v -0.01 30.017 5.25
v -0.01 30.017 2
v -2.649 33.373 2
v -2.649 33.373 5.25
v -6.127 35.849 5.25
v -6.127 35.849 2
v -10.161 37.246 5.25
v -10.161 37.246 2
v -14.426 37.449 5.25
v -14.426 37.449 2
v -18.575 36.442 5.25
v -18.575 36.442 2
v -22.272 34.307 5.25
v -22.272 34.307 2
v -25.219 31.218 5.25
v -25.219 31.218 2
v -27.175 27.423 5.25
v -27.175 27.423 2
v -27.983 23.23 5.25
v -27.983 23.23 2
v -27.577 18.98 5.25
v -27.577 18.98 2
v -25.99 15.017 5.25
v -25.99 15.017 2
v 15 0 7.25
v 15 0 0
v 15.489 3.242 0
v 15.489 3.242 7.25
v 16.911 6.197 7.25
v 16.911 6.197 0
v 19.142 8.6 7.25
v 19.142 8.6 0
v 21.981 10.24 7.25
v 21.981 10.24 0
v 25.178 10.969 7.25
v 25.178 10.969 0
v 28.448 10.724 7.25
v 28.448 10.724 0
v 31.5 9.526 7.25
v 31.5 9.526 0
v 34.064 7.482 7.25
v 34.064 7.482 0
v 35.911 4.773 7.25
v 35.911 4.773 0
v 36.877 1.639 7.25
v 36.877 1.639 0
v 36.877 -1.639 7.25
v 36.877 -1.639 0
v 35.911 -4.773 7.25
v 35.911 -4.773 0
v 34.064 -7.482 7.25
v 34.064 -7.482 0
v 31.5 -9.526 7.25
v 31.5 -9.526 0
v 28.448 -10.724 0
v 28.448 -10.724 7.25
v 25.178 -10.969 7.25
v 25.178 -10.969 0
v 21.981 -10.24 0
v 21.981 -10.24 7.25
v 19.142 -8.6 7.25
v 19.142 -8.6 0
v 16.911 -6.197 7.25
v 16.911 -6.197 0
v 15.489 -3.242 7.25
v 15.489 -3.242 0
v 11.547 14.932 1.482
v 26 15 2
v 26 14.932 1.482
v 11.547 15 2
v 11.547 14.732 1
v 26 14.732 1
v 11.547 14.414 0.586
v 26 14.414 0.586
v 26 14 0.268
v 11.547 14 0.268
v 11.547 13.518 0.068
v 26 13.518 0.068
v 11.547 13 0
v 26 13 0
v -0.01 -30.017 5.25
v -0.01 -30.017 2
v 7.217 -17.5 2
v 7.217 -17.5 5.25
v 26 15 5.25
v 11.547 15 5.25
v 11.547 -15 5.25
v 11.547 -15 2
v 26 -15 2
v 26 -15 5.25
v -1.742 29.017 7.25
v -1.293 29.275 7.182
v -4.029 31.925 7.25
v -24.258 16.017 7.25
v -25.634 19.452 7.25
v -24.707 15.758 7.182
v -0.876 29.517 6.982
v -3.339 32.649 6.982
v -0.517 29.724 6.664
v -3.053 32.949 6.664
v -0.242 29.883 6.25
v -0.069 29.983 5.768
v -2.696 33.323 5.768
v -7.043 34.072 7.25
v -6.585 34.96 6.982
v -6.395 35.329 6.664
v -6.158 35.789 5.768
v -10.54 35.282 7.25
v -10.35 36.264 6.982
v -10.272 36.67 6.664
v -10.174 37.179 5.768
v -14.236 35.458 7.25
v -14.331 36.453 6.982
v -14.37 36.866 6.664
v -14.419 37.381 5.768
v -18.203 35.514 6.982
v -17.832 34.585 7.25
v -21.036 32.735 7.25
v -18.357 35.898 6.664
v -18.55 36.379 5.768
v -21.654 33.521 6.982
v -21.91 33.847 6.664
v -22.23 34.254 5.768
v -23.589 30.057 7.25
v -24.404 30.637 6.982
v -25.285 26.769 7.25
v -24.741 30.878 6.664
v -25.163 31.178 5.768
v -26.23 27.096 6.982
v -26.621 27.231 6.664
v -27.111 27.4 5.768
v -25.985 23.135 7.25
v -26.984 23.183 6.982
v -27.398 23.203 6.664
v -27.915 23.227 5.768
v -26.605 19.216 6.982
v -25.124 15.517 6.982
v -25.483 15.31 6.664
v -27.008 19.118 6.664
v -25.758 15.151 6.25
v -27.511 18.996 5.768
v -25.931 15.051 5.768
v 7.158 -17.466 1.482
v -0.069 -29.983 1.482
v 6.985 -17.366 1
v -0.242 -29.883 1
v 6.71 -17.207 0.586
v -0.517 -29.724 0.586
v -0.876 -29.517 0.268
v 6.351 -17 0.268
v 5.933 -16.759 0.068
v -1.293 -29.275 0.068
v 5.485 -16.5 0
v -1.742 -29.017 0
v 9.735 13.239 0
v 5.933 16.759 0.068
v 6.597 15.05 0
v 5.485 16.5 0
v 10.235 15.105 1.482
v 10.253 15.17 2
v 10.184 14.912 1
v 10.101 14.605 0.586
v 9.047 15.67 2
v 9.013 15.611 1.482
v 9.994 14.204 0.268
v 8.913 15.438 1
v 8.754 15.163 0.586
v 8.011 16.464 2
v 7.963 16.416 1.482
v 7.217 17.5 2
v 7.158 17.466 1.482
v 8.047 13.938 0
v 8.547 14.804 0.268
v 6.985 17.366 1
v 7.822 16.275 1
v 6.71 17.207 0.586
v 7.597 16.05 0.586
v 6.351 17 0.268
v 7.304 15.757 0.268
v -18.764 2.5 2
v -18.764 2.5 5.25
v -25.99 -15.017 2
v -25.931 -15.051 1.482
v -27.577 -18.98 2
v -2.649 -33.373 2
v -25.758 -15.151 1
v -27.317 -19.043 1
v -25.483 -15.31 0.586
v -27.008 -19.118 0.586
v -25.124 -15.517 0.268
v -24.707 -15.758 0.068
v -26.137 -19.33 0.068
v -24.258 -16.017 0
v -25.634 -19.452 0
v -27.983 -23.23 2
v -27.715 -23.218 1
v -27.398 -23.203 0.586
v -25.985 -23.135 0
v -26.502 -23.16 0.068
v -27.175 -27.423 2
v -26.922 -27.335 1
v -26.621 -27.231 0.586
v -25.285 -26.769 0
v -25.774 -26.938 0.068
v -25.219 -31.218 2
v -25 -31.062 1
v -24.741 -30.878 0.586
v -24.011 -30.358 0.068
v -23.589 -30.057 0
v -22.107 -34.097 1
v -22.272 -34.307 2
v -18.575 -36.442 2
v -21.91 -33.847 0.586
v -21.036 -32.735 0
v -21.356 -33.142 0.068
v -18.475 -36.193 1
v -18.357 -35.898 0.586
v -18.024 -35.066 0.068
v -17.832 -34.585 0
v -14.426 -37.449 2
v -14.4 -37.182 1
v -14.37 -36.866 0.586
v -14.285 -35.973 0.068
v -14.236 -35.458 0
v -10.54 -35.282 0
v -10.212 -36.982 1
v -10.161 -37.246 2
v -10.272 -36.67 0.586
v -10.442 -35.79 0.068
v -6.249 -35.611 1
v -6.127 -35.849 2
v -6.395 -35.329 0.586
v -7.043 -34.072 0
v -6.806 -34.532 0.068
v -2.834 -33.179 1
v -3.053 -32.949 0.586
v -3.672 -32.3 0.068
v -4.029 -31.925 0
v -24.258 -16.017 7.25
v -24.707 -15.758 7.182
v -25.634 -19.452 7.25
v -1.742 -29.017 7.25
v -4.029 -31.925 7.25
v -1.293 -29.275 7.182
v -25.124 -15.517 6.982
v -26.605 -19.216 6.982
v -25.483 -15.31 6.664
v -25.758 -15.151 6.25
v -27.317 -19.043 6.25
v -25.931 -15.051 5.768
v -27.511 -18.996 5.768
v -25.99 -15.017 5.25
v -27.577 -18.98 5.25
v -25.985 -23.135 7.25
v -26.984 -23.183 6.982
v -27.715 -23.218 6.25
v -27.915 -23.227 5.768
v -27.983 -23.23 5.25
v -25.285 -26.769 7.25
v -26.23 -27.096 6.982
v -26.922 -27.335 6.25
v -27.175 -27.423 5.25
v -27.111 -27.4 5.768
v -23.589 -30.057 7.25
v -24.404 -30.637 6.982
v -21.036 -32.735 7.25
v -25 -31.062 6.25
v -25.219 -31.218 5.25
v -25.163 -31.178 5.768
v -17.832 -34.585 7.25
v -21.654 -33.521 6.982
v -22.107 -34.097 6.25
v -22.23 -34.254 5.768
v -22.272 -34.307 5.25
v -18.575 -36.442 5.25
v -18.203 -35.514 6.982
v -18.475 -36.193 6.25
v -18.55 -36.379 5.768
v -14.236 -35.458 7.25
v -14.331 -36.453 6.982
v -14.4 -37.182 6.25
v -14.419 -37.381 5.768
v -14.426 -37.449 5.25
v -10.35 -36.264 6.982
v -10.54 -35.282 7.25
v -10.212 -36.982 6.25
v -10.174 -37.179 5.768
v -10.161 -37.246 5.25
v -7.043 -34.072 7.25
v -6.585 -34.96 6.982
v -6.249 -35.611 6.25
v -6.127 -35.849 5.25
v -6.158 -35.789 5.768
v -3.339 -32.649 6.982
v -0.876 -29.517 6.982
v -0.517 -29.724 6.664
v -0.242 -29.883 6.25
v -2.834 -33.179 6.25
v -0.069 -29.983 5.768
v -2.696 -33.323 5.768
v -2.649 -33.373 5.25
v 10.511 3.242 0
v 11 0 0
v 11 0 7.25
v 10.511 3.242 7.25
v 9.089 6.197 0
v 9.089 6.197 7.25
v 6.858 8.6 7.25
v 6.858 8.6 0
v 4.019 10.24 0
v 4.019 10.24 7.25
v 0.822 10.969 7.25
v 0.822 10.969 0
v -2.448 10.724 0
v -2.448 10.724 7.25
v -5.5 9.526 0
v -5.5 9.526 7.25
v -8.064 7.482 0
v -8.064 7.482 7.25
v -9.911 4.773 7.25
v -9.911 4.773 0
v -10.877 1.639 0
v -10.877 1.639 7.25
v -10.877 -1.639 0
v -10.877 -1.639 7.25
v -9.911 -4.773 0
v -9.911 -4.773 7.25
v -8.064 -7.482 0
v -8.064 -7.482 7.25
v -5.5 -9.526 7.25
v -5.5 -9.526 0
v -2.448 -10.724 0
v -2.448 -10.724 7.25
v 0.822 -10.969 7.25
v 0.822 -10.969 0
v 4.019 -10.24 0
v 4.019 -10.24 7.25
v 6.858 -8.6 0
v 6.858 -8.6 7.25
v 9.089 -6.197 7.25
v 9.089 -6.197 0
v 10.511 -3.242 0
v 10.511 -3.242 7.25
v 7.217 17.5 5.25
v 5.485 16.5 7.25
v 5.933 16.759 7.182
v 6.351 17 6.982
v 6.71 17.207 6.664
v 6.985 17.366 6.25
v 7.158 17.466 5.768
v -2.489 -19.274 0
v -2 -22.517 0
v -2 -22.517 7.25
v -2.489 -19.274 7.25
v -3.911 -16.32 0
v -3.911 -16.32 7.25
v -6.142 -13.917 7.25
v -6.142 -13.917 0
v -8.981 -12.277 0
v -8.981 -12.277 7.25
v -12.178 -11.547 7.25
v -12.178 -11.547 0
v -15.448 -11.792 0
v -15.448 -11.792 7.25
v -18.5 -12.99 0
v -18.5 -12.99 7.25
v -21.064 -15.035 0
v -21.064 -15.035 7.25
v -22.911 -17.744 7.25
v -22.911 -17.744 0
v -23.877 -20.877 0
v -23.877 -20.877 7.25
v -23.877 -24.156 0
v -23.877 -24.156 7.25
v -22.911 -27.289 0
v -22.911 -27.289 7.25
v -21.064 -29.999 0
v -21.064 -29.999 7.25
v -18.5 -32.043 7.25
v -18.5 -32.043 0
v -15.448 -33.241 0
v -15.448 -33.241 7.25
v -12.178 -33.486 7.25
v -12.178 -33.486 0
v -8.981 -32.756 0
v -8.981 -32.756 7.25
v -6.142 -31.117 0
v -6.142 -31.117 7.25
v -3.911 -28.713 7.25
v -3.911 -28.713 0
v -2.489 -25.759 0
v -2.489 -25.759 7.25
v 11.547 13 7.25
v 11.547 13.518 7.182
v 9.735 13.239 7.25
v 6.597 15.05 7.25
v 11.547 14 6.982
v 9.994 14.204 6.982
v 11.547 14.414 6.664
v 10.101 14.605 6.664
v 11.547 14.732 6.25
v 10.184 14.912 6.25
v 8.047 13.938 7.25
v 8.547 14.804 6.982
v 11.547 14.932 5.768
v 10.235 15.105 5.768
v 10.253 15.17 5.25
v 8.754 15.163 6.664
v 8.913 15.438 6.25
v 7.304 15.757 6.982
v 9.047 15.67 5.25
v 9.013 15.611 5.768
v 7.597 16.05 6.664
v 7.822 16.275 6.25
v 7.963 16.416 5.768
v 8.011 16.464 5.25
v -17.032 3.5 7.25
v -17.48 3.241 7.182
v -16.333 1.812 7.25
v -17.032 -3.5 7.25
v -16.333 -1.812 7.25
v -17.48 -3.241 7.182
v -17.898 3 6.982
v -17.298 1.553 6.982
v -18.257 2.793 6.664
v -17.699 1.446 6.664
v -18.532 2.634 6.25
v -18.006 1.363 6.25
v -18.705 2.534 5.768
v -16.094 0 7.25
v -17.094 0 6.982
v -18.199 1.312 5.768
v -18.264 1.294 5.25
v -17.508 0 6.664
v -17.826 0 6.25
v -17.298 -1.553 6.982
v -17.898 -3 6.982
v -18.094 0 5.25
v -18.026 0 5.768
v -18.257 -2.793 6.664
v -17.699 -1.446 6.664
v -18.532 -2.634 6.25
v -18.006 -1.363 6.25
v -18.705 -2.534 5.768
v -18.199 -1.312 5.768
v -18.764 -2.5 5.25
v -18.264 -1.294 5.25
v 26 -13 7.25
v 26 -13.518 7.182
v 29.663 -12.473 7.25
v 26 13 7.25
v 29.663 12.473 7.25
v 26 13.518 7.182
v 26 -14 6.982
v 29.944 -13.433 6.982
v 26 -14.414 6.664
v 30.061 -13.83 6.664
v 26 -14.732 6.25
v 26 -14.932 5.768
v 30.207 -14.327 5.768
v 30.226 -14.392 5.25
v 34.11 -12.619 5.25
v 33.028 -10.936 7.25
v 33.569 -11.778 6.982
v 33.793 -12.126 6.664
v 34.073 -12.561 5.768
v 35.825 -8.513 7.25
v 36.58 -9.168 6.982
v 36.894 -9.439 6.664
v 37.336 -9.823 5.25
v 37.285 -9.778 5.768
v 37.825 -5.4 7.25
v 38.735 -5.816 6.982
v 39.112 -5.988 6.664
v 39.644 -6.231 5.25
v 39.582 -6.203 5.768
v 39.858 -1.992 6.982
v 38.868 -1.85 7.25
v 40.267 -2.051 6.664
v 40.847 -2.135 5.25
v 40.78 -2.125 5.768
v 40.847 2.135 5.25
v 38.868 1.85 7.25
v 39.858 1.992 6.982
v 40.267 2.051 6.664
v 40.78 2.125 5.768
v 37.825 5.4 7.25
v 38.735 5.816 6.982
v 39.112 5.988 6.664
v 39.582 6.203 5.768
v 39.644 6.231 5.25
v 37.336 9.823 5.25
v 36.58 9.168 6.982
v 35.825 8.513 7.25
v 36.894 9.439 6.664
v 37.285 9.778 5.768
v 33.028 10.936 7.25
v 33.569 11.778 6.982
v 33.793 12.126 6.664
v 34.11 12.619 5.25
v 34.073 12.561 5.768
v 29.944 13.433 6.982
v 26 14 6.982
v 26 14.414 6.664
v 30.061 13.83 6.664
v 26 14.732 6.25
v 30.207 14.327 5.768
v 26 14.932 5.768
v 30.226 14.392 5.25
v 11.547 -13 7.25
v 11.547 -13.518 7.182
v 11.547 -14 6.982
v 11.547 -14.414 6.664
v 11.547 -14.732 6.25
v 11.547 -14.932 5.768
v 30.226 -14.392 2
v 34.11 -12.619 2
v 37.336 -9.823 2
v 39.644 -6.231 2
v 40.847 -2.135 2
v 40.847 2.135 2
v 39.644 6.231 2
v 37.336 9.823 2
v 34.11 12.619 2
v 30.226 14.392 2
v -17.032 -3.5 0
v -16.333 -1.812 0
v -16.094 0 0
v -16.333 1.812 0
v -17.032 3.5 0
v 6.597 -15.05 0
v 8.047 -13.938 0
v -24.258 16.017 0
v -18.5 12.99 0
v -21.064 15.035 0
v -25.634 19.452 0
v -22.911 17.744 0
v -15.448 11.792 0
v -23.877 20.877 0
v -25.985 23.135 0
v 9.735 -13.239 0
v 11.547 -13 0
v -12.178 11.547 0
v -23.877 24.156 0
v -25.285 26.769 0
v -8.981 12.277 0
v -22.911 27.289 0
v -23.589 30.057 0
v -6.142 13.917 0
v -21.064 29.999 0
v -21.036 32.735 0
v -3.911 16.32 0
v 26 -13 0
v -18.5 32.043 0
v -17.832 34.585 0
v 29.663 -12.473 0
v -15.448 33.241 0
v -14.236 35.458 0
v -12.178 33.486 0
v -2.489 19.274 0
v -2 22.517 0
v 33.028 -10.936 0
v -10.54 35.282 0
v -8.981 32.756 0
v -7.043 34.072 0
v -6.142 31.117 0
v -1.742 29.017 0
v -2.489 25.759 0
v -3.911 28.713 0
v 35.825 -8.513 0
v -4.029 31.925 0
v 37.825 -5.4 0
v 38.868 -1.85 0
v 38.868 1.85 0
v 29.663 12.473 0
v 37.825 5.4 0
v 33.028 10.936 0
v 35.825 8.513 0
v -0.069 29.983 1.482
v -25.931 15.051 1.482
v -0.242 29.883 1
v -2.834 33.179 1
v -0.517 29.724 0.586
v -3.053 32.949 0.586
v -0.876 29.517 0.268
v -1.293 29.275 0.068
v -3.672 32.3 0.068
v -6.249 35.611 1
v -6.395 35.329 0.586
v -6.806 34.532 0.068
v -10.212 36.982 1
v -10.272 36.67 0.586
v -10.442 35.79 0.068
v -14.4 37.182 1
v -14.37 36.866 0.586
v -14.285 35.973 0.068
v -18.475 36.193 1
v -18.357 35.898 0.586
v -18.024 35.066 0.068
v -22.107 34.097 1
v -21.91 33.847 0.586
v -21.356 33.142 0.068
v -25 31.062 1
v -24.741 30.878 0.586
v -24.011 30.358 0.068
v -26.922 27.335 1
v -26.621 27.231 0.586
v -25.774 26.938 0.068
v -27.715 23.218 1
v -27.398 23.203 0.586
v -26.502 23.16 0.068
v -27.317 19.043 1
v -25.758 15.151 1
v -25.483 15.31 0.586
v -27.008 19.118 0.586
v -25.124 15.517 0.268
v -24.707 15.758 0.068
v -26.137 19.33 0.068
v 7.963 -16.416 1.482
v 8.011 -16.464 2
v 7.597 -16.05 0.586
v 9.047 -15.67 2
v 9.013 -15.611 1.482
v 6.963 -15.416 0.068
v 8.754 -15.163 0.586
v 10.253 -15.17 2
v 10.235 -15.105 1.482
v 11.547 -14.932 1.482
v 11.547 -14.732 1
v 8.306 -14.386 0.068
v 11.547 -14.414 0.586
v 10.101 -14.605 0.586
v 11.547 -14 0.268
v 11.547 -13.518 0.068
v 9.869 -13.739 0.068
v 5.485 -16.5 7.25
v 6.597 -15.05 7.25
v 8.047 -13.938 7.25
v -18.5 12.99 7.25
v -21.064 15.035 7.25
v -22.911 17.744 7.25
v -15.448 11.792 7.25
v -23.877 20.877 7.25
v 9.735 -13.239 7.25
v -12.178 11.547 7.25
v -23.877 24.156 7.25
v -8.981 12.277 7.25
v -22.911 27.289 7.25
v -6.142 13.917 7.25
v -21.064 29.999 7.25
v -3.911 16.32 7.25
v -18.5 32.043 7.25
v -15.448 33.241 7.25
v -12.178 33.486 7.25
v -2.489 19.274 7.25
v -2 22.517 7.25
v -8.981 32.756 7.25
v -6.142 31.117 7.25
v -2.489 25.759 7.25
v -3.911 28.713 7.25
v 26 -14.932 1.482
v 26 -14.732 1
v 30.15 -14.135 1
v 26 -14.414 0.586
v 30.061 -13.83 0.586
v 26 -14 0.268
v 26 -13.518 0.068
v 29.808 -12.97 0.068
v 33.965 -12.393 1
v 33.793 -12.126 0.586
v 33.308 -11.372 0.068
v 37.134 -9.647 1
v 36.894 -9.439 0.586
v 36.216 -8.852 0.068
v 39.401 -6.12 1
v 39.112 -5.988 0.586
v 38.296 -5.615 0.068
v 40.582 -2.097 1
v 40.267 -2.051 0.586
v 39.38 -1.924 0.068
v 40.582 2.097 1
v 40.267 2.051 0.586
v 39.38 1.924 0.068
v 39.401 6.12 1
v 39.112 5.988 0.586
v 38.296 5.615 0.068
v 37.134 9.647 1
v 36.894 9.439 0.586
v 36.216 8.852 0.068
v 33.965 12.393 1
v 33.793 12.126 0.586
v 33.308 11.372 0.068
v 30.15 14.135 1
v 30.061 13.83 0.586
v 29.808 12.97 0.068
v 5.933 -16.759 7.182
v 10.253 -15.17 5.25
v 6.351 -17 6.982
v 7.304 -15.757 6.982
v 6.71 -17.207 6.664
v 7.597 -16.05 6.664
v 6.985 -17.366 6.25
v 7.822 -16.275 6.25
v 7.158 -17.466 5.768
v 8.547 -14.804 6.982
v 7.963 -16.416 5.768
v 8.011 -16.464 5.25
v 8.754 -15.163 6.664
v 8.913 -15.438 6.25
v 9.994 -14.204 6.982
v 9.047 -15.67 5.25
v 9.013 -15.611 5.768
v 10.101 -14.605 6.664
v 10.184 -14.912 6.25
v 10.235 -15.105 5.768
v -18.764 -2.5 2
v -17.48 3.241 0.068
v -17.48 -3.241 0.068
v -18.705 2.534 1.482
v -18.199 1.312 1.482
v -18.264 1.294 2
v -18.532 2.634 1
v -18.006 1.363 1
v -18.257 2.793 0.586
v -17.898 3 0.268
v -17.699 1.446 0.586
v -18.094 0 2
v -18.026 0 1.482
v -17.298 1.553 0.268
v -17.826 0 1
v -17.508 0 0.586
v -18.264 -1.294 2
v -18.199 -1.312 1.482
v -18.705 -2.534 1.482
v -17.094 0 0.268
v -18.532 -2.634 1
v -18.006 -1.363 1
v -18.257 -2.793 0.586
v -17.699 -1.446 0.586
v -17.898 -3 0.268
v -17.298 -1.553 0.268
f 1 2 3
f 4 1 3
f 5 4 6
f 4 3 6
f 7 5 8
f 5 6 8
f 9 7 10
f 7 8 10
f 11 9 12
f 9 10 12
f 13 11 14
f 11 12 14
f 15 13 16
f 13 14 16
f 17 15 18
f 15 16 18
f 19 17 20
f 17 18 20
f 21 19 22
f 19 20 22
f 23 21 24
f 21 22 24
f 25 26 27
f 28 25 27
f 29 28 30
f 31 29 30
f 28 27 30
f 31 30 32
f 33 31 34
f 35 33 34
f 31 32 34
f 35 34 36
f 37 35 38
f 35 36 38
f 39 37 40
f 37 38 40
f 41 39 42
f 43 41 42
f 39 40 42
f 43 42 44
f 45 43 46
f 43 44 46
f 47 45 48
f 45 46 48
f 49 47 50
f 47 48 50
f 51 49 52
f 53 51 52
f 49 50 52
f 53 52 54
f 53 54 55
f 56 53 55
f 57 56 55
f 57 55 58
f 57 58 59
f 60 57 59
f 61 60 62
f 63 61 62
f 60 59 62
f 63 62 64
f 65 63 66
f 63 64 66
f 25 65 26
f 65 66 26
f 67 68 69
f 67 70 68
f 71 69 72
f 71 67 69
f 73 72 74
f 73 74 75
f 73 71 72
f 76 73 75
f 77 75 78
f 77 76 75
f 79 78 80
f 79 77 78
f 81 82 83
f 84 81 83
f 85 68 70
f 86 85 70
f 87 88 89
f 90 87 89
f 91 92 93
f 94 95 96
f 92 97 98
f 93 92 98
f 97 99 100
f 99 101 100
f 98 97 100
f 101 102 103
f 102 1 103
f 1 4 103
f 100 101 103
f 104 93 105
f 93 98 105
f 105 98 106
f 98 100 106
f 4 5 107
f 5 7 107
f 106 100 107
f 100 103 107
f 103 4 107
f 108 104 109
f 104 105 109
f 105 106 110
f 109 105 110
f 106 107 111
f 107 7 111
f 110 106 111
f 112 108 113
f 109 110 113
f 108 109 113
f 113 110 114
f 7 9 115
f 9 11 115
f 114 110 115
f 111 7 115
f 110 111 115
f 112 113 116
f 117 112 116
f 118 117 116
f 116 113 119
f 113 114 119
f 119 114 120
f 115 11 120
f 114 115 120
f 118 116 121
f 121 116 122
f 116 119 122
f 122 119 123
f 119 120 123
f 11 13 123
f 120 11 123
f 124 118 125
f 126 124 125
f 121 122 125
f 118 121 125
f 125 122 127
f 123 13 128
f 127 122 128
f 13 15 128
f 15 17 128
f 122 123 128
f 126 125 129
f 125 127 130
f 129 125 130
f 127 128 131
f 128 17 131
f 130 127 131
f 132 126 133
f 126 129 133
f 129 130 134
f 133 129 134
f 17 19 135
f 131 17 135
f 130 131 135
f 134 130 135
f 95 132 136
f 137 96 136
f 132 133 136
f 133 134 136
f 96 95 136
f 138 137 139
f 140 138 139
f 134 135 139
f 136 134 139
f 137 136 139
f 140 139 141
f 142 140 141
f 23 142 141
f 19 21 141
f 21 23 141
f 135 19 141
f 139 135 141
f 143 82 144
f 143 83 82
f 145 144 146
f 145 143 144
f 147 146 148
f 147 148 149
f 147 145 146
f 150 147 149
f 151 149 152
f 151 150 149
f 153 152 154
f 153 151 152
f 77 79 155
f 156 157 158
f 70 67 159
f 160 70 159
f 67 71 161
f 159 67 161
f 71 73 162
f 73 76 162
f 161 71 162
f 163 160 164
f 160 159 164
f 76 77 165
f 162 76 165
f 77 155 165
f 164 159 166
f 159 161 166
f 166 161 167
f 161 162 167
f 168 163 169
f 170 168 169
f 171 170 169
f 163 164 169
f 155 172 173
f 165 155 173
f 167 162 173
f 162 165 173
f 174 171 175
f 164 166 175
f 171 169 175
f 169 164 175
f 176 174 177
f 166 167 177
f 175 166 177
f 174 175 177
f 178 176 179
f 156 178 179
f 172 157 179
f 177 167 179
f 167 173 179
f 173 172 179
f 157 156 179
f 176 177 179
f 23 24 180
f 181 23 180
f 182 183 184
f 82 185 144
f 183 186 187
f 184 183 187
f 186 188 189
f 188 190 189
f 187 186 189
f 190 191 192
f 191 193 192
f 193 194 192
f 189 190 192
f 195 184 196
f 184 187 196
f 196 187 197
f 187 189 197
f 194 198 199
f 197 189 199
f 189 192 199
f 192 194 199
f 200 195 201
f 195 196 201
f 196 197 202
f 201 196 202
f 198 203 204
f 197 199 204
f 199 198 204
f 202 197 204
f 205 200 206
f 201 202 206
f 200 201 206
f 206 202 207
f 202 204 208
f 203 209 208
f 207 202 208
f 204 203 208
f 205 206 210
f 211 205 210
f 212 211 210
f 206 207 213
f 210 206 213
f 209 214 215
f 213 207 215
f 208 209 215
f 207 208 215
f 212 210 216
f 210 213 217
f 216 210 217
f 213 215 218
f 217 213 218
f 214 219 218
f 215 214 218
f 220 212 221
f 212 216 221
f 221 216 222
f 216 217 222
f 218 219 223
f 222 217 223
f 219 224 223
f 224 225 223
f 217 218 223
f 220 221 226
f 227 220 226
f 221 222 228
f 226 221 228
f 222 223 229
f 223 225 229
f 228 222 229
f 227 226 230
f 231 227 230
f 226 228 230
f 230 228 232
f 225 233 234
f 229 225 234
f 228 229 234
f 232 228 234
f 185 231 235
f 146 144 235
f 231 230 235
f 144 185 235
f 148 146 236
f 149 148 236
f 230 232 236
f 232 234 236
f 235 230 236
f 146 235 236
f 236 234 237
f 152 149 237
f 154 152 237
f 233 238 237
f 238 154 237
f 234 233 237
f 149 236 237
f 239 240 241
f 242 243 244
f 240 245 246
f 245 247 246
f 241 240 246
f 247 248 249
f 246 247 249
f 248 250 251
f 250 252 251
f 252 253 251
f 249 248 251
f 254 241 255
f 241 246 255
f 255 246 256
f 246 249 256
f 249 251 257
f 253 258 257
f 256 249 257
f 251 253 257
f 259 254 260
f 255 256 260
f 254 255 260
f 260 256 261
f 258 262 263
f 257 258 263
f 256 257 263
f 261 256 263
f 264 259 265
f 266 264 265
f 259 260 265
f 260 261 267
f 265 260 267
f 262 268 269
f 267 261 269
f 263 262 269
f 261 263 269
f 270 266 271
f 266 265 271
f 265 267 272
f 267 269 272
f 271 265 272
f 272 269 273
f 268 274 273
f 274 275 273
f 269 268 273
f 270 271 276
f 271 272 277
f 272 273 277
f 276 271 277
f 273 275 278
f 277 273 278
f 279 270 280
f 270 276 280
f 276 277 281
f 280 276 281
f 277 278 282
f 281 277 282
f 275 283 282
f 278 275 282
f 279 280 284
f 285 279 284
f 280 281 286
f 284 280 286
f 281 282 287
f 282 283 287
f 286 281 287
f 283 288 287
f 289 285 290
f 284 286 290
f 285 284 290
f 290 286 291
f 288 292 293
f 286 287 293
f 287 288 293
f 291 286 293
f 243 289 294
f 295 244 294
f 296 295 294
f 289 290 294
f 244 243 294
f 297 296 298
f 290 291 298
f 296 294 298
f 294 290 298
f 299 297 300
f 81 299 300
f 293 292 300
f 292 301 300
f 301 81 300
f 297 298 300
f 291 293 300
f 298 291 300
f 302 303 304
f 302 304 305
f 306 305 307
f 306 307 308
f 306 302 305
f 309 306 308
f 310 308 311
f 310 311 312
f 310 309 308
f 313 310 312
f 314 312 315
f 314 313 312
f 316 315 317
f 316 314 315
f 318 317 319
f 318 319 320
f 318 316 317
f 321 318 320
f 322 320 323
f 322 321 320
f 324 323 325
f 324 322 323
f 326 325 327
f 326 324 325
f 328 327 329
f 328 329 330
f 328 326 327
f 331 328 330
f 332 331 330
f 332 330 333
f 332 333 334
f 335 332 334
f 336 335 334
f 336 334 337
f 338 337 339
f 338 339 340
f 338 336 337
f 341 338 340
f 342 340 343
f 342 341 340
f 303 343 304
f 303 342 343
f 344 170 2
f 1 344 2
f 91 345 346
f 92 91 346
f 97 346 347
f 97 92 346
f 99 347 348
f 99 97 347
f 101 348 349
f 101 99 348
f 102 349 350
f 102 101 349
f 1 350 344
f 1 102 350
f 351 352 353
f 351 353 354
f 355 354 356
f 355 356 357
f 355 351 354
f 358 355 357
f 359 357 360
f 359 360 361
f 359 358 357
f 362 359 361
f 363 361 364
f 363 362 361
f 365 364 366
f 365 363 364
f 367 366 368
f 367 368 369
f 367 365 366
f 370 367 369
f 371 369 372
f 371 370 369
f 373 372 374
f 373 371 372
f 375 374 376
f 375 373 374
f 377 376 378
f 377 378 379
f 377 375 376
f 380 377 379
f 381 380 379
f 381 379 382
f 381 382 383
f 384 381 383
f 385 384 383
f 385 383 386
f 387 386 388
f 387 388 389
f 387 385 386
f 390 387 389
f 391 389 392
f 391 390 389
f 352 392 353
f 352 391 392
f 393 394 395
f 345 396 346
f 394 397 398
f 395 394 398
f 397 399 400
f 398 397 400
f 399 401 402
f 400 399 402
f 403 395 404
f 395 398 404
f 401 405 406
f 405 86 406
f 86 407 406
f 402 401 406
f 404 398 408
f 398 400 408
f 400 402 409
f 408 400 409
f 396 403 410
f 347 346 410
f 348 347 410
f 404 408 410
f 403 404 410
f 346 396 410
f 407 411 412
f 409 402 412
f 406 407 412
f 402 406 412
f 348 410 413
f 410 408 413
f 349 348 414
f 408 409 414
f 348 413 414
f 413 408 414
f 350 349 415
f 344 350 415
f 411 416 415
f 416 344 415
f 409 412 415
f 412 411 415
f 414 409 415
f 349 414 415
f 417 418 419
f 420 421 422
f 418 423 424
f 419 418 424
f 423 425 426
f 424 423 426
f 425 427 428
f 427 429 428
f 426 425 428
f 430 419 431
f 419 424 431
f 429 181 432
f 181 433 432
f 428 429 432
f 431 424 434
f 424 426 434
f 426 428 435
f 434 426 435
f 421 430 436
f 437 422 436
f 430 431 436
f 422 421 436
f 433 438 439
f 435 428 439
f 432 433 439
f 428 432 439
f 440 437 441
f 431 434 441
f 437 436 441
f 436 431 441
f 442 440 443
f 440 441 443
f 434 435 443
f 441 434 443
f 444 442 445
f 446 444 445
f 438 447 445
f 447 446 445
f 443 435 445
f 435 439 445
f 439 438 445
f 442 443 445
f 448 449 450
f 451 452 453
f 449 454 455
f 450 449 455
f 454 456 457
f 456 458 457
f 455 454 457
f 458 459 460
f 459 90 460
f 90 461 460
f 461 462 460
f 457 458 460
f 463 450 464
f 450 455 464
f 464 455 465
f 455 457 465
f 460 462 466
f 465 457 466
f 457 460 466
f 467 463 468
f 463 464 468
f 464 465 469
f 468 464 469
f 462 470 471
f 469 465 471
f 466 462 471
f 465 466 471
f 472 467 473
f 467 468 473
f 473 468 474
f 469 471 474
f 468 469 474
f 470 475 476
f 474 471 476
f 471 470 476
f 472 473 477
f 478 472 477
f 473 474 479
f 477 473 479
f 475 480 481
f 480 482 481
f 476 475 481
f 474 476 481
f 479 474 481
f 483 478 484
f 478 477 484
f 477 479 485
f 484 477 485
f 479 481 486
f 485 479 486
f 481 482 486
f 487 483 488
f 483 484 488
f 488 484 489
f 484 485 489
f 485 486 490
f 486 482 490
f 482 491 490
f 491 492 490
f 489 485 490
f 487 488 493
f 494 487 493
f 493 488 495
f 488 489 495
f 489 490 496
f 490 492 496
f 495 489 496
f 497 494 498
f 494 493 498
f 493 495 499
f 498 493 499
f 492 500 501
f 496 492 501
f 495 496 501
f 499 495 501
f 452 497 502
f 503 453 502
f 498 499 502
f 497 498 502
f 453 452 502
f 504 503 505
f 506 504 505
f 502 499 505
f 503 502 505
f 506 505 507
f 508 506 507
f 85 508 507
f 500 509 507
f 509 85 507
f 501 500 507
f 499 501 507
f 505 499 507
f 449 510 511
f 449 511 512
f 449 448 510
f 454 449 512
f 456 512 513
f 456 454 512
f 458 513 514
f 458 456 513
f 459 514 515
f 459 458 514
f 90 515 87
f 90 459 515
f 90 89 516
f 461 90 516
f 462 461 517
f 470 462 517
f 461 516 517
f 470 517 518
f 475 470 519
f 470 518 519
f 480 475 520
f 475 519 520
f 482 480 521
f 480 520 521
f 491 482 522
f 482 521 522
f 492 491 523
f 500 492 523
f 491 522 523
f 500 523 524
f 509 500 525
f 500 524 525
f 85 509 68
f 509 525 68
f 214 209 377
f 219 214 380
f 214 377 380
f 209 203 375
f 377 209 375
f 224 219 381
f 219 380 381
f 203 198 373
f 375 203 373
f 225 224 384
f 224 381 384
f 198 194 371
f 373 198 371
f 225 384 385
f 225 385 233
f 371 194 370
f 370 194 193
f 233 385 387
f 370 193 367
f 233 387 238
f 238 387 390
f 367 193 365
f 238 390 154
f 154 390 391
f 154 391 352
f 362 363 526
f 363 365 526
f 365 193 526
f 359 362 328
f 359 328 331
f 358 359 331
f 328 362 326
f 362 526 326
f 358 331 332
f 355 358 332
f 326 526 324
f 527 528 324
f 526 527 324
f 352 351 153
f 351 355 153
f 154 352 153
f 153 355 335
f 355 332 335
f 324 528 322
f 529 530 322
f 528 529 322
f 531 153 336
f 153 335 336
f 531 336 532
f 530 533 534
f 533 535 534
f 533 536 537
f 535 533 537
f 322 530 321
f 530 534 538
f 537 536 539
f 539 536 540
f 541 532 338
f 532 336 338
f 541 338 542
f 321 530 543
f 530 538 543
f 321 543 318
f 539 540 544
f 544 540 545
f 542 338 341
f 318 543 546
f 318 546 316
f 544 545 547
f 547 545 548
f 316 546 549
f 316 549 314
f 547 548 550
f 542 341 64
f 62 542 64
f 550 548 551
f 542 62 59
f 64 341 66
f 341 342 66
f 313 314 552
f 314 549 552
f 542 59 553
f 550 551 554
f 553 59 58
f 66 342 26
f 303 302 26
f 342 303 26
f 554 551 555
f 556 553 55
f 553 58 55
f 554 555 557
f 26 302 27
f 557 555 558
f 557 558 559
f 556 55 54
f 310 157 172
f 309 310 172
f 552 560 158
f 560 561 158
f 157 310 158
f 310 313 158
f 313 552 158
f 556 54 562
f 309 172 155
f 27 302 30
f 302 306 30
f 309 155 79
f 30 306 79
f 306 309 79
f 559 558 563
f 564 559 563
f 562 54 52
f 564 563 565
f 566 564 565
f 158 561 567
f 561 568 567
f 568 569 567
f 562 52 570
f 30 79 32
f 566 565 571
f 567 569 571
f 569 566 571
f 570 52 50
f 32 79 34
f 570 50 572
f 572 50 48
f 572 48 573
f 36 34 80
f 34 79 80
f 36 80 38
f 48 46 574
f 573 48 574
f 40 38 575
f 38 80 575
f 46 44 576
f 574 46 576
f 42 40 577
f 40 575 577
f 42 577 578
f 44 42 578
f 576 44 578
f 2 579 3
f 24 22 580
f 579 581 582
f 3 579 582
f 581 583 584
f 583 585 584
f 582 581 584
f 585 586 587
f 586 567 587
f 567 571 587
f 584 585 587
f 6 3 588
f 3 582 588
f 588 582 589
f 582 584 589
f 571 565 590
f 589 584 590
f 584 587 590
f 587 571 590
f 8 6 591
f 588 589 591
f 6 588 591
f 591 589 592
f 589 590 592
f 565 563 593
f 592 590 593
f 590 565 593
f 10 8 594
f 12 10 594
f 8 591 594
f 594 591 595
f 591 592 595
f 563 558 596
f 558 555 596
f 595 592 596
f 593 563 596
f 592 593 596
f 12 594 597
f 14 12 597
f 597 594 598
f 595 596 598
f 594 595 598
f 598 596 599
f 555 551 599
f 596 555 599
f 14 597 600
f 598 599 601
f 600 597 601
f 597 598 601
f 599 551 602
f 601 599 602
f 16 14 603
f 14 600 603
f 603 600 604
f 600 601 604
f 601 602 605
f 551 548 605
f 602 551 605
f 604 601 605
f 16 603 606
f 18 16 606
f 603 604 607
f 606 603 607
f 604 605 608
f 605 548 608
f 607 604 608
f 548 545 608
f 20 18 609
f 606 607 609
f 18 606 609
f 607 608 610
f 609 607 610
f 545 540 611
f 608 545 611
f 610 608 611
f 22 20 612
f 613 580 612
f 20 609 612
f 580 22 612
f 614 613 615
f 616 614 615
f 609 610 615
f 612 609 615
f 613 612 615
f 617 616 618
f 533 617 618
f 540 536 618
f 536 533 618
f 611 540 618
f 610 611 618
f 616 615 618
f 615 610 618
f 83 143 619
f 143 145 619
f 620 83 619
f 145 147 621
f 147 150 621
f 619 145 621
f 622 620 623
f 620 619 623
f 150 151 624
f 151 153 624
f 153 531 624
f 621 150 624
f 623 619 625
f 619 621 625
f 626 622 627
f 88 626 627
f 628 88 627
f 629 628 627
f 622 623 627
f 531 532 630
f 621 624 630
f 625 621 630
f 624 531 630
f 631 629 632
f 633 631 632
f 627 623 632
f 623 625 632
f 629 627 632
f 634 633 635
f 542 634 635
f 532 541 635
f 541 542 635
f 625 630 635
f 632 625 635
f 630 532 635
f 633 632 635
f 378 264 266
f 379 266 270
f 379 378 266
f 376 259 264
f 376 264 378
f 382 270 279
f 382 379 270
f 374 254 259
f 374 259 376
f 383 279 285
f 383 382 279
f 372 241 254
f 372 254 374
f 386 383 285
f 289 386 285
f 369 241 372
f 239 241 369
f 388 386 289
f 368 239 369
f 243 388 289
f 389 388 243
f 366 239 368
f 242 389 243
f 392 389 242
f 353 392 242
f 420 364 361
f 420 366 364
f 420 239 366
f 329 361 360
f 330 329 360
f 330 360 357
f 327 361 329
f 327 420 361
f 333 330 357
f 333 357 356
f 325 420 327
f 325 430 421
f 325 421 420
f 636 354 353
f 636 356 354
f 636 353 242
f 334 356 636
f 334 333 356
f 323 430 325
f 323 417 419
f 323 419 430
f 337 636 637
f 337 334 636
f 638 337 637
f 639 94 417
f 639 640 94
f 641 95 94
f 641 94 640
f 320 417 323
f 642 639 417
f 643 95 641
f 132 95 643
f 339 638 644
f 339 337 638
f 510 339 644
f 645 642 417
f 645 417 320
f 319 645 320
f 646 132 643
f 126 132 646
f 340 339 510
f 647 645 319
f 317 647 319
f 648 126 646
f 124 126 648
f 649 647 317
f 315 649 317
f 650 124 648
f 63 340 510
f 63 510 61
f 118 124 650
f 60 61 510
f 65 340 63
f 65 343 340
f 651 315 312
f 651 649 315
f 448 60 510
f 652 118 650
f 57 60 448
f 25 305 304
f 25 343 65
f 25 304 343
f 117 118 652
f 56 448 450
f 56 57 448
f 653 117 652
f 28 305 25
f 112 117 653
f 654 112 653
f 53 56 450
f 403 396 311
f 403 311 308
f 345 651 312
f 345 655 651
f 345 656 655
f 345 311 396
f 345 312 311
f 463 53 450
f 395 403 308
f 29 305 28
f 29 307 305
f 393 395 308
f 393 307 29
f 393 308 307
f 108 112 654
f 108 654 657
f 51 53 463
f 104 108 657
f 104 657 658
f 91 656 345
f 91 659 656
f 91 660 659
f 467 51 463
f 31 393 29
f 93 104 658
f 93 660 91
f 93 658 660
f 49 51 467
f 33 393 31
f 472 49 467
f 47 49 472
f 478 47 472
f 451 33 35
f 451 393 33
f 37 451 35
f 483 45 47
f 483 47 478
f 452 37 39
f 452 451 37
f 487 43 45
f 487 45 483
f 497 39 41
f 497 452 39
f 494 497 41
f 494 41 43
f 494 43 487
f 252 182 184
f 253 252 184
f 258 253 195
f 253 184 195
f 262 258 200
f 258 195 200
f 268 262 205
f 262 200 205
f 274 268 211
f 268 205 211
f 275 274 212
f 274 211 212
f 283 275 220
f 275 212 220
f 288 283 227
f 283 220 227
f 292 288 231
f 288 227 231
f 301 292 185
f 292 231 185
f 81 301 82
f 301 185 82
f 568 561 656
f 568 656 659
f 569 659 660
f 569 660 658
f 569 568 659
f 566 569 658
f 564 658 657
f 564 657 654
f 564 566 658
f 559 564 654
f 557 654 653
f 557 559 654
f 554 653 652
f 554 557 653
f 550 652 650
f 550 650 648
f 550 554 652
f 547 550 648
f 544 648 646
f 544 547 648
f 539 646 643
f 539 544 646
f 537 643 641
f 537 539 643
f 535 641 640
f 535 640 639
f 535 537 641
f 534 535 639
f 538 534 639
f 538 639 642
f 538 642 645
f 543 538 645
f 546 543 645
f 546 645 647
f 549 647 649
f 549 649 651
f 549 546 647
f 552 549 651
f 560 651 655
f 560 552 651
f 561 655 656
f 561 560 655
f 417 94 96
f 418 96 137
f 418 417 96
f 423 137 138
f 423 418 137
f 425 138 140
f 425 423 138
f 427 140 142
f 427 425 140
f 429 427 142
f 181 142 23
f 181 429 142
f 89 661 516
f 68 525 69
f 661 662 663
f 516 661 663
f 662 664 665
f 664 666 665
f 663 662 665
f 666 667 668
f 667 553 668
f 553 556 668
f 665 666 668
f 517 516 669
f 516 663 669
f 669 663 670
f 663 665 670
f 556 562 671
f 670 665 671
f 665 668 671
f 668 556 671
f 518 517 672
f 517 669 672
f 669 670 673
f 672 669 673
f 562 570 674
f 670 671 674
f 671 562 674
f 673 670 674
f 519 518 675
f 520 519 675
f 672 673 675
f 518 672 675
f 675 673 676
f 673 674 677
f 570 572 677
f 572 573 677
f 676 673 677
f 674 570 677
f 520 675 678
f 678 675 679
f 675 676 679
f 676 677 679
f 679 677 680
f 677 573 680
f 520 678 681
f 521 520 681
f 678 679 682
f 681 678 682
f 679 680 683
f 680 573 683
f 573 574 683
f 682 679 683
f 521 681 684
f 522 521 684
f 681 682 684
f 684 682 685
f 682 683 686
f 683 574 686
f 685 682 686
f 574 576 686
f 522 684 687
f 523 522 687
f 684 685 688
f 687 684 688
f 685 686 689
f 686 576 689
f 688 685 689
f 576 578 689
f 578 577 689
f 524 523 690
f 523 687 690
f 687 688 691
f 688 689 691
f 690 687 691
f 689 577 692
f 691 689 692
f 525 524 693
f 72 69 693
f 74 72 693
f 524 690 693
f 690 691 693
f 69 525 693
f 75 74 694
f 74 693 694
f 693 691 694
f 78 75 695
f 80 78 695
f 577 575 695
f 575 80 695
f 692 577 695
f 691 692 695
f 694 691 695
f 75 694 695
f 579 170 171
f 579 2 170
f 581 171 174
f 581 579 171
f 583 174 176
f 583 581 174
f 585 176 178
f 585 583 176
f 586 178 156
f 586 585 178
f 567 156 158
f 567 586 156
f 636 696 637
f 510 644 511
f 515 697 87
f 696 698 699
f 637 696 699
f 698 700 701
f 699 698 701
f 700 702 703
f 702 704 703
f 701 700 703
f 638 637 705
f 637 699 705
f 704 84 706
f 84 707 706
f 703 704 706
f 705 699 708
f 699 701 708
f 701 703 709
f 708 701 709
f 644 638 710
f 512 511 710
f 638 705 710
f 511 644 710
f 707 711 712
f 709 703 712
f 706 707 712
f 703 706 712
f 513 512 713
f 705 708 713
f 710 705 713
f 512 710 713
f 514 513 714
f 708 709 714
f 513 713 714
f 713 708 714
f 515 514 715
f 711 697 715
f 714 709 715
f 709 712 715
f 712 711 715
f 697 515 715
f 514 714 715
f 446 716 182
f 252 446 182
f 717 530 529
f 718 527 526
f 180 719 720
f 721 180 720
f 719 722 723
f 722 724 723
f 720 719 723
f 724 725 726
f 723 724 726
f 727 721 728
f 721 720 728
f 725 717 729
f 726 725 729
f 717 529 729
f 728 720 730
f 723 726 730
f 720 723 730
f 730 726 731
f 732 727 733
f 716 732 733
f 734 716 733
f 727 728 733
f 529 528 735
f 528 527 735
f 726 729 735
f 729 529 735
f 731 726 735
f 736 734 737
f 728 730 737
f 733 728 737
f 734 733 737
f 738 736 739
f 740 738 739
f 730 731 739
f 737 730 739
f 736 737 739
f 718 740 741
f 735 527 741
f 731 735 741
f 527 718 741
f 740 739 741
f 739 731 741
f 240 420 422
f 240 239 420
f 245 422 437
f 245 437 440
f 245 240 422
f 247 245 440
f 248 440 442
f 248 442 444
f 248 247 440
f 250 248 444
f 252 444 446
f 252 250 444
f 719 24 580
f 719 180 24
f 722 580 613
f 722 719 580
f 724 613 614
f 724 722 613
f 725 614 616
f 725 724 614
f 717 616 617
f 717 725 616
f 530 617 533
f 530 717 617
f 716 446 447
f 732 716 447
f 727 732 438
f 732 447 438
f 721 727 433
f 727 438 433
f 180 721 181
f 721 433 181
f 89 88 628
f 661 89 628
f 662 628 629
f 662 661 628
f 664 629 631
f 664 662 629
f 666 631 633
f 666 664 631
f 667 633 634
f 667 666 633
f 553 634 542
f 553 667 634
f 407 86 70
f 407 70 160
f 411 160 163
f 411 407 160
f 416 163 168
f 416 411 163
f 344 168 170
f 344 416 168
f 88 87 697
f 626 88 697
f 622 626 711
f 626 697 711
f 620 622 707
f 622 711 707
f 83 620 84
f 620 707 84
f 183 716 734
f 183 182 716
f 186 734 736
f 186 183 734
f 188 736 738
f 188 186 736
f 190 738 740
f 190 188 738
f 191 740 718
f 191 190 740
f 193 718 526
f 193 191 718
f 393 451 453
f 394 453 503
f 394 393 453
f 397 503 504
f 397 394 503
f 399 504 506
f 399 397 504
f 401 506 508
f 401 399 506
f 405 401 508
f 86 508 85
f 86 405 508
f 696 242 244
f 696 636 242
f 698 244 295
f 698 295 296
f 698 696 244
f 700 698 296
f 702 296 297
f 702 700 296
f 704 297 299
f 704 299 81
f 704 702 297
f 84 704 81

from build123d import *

# Parameters (mm, degrees)
F0_R     = 11
F1_DEPTH = 7.25
F2_R     = 5
F3_R     = 2


with BuildPart() as f1:
    # F0 (on Top) → F1 (new body)
    with BuildSketch(Plane.XY):
        with BuildLine():
            Line((8.6602539087, -14.9999997764), (25.9999998066, -15))
            ThreePointArc((25.9999998066, -15), (41, 0), (25.9999998066, 15))
            Line((25.9999998066, 15), (8.6602539087, 14.9999997764))
            Line((8.6602539087, 14.9999997764), (-0.0096188465, 30.0166603309))
            ThreePointArc((-0.0096188465, 30.0166603309), (-20.5, 35.5070415552), (-25.9903809601, 15.0166603309))
            Line((-25.9903809601, 15.0166603309), (-17.3205078175, 0))
            Line((-17.3205078175, 0), (-25.9903809601, -15.0166603309))
            ThreePointArc((-25.9903809601, -15.0166603309), (-20.5, -35.5070415552), (-0.0096188465, -30.0166603309))
            Line((-0.0096188465, -30.0166603309), (8.6602539087, -14.9999997764))
        make_face()
        with Locations((-13, -22.5166604984)):
            Circle(F0_R, mode=Mode.SUBTRACT)
        Circle(F0_R, mode=Mode.SUBTRACT)
        with BuildLine():
            ThreePointArc((37, 0), (26, -11), (15, 0))
            ThreePointArc((15, 0), (26, 11), (37, 0))
        make_face(mode=Mode.SUBTRACT)
        with Locations((-13, 22.5166604984)):
            Circle(F0_R, mode=Mode.SUBTRACT)
    extrude(amount=F1_DEPTH)

    # F2
    f2_edges = [f1.edges().sort_by_distance(p)[0] for p in [
        (8.660254, 15, 3.625),
        (-17.320508, 0, 3.625),
        (8.660254, -15, 3.625),
    ]]
    fillet(f2_edges, radius=F2_R)

    # F3
    f3_edges = [f1.edges().sort_by_distance(p)[0] for p in [
        (3.60363, -23.75833, 7.25),
        (-20.5, -35.507042, 7.25),
        (-22.377132, -8.75833, 7.25),
        (-18.094011, 0, 7.25),
        (-22.377132, 8.75833, 7.25),
        (-20.5, 35.507042, 7.25),
        (3.60363, 23.75833, 7.25),
        (18.773503, 15, 7.25),
        (41, 0, 7.25),
        (18.773503, -15, 7.25),
        (9.047005, -15.669873, 7.25),
        (9.047005, 15.669873, 7.25),
        (18.773503, -15, 0),
        (3.60363, -23.75833, 0),
        (-22.377132, -8.75833, 0),
        (-20.5, -35.507042, 0),
        (41, 0, 0),
        (18.773503, 15, 0),
        (-20.5, 35.507042, 0),
        (3.60363, 23.75833, 0),
        (-22.377132, 8.75833, 0),
        (-18.094011, 0, 0),
        (9.047005, 15.669873, 0),
        (9.047005, -15.669873, 0),
    ]]
    fillet(f3_edges, radius=F3_R)


solid = f1.part
